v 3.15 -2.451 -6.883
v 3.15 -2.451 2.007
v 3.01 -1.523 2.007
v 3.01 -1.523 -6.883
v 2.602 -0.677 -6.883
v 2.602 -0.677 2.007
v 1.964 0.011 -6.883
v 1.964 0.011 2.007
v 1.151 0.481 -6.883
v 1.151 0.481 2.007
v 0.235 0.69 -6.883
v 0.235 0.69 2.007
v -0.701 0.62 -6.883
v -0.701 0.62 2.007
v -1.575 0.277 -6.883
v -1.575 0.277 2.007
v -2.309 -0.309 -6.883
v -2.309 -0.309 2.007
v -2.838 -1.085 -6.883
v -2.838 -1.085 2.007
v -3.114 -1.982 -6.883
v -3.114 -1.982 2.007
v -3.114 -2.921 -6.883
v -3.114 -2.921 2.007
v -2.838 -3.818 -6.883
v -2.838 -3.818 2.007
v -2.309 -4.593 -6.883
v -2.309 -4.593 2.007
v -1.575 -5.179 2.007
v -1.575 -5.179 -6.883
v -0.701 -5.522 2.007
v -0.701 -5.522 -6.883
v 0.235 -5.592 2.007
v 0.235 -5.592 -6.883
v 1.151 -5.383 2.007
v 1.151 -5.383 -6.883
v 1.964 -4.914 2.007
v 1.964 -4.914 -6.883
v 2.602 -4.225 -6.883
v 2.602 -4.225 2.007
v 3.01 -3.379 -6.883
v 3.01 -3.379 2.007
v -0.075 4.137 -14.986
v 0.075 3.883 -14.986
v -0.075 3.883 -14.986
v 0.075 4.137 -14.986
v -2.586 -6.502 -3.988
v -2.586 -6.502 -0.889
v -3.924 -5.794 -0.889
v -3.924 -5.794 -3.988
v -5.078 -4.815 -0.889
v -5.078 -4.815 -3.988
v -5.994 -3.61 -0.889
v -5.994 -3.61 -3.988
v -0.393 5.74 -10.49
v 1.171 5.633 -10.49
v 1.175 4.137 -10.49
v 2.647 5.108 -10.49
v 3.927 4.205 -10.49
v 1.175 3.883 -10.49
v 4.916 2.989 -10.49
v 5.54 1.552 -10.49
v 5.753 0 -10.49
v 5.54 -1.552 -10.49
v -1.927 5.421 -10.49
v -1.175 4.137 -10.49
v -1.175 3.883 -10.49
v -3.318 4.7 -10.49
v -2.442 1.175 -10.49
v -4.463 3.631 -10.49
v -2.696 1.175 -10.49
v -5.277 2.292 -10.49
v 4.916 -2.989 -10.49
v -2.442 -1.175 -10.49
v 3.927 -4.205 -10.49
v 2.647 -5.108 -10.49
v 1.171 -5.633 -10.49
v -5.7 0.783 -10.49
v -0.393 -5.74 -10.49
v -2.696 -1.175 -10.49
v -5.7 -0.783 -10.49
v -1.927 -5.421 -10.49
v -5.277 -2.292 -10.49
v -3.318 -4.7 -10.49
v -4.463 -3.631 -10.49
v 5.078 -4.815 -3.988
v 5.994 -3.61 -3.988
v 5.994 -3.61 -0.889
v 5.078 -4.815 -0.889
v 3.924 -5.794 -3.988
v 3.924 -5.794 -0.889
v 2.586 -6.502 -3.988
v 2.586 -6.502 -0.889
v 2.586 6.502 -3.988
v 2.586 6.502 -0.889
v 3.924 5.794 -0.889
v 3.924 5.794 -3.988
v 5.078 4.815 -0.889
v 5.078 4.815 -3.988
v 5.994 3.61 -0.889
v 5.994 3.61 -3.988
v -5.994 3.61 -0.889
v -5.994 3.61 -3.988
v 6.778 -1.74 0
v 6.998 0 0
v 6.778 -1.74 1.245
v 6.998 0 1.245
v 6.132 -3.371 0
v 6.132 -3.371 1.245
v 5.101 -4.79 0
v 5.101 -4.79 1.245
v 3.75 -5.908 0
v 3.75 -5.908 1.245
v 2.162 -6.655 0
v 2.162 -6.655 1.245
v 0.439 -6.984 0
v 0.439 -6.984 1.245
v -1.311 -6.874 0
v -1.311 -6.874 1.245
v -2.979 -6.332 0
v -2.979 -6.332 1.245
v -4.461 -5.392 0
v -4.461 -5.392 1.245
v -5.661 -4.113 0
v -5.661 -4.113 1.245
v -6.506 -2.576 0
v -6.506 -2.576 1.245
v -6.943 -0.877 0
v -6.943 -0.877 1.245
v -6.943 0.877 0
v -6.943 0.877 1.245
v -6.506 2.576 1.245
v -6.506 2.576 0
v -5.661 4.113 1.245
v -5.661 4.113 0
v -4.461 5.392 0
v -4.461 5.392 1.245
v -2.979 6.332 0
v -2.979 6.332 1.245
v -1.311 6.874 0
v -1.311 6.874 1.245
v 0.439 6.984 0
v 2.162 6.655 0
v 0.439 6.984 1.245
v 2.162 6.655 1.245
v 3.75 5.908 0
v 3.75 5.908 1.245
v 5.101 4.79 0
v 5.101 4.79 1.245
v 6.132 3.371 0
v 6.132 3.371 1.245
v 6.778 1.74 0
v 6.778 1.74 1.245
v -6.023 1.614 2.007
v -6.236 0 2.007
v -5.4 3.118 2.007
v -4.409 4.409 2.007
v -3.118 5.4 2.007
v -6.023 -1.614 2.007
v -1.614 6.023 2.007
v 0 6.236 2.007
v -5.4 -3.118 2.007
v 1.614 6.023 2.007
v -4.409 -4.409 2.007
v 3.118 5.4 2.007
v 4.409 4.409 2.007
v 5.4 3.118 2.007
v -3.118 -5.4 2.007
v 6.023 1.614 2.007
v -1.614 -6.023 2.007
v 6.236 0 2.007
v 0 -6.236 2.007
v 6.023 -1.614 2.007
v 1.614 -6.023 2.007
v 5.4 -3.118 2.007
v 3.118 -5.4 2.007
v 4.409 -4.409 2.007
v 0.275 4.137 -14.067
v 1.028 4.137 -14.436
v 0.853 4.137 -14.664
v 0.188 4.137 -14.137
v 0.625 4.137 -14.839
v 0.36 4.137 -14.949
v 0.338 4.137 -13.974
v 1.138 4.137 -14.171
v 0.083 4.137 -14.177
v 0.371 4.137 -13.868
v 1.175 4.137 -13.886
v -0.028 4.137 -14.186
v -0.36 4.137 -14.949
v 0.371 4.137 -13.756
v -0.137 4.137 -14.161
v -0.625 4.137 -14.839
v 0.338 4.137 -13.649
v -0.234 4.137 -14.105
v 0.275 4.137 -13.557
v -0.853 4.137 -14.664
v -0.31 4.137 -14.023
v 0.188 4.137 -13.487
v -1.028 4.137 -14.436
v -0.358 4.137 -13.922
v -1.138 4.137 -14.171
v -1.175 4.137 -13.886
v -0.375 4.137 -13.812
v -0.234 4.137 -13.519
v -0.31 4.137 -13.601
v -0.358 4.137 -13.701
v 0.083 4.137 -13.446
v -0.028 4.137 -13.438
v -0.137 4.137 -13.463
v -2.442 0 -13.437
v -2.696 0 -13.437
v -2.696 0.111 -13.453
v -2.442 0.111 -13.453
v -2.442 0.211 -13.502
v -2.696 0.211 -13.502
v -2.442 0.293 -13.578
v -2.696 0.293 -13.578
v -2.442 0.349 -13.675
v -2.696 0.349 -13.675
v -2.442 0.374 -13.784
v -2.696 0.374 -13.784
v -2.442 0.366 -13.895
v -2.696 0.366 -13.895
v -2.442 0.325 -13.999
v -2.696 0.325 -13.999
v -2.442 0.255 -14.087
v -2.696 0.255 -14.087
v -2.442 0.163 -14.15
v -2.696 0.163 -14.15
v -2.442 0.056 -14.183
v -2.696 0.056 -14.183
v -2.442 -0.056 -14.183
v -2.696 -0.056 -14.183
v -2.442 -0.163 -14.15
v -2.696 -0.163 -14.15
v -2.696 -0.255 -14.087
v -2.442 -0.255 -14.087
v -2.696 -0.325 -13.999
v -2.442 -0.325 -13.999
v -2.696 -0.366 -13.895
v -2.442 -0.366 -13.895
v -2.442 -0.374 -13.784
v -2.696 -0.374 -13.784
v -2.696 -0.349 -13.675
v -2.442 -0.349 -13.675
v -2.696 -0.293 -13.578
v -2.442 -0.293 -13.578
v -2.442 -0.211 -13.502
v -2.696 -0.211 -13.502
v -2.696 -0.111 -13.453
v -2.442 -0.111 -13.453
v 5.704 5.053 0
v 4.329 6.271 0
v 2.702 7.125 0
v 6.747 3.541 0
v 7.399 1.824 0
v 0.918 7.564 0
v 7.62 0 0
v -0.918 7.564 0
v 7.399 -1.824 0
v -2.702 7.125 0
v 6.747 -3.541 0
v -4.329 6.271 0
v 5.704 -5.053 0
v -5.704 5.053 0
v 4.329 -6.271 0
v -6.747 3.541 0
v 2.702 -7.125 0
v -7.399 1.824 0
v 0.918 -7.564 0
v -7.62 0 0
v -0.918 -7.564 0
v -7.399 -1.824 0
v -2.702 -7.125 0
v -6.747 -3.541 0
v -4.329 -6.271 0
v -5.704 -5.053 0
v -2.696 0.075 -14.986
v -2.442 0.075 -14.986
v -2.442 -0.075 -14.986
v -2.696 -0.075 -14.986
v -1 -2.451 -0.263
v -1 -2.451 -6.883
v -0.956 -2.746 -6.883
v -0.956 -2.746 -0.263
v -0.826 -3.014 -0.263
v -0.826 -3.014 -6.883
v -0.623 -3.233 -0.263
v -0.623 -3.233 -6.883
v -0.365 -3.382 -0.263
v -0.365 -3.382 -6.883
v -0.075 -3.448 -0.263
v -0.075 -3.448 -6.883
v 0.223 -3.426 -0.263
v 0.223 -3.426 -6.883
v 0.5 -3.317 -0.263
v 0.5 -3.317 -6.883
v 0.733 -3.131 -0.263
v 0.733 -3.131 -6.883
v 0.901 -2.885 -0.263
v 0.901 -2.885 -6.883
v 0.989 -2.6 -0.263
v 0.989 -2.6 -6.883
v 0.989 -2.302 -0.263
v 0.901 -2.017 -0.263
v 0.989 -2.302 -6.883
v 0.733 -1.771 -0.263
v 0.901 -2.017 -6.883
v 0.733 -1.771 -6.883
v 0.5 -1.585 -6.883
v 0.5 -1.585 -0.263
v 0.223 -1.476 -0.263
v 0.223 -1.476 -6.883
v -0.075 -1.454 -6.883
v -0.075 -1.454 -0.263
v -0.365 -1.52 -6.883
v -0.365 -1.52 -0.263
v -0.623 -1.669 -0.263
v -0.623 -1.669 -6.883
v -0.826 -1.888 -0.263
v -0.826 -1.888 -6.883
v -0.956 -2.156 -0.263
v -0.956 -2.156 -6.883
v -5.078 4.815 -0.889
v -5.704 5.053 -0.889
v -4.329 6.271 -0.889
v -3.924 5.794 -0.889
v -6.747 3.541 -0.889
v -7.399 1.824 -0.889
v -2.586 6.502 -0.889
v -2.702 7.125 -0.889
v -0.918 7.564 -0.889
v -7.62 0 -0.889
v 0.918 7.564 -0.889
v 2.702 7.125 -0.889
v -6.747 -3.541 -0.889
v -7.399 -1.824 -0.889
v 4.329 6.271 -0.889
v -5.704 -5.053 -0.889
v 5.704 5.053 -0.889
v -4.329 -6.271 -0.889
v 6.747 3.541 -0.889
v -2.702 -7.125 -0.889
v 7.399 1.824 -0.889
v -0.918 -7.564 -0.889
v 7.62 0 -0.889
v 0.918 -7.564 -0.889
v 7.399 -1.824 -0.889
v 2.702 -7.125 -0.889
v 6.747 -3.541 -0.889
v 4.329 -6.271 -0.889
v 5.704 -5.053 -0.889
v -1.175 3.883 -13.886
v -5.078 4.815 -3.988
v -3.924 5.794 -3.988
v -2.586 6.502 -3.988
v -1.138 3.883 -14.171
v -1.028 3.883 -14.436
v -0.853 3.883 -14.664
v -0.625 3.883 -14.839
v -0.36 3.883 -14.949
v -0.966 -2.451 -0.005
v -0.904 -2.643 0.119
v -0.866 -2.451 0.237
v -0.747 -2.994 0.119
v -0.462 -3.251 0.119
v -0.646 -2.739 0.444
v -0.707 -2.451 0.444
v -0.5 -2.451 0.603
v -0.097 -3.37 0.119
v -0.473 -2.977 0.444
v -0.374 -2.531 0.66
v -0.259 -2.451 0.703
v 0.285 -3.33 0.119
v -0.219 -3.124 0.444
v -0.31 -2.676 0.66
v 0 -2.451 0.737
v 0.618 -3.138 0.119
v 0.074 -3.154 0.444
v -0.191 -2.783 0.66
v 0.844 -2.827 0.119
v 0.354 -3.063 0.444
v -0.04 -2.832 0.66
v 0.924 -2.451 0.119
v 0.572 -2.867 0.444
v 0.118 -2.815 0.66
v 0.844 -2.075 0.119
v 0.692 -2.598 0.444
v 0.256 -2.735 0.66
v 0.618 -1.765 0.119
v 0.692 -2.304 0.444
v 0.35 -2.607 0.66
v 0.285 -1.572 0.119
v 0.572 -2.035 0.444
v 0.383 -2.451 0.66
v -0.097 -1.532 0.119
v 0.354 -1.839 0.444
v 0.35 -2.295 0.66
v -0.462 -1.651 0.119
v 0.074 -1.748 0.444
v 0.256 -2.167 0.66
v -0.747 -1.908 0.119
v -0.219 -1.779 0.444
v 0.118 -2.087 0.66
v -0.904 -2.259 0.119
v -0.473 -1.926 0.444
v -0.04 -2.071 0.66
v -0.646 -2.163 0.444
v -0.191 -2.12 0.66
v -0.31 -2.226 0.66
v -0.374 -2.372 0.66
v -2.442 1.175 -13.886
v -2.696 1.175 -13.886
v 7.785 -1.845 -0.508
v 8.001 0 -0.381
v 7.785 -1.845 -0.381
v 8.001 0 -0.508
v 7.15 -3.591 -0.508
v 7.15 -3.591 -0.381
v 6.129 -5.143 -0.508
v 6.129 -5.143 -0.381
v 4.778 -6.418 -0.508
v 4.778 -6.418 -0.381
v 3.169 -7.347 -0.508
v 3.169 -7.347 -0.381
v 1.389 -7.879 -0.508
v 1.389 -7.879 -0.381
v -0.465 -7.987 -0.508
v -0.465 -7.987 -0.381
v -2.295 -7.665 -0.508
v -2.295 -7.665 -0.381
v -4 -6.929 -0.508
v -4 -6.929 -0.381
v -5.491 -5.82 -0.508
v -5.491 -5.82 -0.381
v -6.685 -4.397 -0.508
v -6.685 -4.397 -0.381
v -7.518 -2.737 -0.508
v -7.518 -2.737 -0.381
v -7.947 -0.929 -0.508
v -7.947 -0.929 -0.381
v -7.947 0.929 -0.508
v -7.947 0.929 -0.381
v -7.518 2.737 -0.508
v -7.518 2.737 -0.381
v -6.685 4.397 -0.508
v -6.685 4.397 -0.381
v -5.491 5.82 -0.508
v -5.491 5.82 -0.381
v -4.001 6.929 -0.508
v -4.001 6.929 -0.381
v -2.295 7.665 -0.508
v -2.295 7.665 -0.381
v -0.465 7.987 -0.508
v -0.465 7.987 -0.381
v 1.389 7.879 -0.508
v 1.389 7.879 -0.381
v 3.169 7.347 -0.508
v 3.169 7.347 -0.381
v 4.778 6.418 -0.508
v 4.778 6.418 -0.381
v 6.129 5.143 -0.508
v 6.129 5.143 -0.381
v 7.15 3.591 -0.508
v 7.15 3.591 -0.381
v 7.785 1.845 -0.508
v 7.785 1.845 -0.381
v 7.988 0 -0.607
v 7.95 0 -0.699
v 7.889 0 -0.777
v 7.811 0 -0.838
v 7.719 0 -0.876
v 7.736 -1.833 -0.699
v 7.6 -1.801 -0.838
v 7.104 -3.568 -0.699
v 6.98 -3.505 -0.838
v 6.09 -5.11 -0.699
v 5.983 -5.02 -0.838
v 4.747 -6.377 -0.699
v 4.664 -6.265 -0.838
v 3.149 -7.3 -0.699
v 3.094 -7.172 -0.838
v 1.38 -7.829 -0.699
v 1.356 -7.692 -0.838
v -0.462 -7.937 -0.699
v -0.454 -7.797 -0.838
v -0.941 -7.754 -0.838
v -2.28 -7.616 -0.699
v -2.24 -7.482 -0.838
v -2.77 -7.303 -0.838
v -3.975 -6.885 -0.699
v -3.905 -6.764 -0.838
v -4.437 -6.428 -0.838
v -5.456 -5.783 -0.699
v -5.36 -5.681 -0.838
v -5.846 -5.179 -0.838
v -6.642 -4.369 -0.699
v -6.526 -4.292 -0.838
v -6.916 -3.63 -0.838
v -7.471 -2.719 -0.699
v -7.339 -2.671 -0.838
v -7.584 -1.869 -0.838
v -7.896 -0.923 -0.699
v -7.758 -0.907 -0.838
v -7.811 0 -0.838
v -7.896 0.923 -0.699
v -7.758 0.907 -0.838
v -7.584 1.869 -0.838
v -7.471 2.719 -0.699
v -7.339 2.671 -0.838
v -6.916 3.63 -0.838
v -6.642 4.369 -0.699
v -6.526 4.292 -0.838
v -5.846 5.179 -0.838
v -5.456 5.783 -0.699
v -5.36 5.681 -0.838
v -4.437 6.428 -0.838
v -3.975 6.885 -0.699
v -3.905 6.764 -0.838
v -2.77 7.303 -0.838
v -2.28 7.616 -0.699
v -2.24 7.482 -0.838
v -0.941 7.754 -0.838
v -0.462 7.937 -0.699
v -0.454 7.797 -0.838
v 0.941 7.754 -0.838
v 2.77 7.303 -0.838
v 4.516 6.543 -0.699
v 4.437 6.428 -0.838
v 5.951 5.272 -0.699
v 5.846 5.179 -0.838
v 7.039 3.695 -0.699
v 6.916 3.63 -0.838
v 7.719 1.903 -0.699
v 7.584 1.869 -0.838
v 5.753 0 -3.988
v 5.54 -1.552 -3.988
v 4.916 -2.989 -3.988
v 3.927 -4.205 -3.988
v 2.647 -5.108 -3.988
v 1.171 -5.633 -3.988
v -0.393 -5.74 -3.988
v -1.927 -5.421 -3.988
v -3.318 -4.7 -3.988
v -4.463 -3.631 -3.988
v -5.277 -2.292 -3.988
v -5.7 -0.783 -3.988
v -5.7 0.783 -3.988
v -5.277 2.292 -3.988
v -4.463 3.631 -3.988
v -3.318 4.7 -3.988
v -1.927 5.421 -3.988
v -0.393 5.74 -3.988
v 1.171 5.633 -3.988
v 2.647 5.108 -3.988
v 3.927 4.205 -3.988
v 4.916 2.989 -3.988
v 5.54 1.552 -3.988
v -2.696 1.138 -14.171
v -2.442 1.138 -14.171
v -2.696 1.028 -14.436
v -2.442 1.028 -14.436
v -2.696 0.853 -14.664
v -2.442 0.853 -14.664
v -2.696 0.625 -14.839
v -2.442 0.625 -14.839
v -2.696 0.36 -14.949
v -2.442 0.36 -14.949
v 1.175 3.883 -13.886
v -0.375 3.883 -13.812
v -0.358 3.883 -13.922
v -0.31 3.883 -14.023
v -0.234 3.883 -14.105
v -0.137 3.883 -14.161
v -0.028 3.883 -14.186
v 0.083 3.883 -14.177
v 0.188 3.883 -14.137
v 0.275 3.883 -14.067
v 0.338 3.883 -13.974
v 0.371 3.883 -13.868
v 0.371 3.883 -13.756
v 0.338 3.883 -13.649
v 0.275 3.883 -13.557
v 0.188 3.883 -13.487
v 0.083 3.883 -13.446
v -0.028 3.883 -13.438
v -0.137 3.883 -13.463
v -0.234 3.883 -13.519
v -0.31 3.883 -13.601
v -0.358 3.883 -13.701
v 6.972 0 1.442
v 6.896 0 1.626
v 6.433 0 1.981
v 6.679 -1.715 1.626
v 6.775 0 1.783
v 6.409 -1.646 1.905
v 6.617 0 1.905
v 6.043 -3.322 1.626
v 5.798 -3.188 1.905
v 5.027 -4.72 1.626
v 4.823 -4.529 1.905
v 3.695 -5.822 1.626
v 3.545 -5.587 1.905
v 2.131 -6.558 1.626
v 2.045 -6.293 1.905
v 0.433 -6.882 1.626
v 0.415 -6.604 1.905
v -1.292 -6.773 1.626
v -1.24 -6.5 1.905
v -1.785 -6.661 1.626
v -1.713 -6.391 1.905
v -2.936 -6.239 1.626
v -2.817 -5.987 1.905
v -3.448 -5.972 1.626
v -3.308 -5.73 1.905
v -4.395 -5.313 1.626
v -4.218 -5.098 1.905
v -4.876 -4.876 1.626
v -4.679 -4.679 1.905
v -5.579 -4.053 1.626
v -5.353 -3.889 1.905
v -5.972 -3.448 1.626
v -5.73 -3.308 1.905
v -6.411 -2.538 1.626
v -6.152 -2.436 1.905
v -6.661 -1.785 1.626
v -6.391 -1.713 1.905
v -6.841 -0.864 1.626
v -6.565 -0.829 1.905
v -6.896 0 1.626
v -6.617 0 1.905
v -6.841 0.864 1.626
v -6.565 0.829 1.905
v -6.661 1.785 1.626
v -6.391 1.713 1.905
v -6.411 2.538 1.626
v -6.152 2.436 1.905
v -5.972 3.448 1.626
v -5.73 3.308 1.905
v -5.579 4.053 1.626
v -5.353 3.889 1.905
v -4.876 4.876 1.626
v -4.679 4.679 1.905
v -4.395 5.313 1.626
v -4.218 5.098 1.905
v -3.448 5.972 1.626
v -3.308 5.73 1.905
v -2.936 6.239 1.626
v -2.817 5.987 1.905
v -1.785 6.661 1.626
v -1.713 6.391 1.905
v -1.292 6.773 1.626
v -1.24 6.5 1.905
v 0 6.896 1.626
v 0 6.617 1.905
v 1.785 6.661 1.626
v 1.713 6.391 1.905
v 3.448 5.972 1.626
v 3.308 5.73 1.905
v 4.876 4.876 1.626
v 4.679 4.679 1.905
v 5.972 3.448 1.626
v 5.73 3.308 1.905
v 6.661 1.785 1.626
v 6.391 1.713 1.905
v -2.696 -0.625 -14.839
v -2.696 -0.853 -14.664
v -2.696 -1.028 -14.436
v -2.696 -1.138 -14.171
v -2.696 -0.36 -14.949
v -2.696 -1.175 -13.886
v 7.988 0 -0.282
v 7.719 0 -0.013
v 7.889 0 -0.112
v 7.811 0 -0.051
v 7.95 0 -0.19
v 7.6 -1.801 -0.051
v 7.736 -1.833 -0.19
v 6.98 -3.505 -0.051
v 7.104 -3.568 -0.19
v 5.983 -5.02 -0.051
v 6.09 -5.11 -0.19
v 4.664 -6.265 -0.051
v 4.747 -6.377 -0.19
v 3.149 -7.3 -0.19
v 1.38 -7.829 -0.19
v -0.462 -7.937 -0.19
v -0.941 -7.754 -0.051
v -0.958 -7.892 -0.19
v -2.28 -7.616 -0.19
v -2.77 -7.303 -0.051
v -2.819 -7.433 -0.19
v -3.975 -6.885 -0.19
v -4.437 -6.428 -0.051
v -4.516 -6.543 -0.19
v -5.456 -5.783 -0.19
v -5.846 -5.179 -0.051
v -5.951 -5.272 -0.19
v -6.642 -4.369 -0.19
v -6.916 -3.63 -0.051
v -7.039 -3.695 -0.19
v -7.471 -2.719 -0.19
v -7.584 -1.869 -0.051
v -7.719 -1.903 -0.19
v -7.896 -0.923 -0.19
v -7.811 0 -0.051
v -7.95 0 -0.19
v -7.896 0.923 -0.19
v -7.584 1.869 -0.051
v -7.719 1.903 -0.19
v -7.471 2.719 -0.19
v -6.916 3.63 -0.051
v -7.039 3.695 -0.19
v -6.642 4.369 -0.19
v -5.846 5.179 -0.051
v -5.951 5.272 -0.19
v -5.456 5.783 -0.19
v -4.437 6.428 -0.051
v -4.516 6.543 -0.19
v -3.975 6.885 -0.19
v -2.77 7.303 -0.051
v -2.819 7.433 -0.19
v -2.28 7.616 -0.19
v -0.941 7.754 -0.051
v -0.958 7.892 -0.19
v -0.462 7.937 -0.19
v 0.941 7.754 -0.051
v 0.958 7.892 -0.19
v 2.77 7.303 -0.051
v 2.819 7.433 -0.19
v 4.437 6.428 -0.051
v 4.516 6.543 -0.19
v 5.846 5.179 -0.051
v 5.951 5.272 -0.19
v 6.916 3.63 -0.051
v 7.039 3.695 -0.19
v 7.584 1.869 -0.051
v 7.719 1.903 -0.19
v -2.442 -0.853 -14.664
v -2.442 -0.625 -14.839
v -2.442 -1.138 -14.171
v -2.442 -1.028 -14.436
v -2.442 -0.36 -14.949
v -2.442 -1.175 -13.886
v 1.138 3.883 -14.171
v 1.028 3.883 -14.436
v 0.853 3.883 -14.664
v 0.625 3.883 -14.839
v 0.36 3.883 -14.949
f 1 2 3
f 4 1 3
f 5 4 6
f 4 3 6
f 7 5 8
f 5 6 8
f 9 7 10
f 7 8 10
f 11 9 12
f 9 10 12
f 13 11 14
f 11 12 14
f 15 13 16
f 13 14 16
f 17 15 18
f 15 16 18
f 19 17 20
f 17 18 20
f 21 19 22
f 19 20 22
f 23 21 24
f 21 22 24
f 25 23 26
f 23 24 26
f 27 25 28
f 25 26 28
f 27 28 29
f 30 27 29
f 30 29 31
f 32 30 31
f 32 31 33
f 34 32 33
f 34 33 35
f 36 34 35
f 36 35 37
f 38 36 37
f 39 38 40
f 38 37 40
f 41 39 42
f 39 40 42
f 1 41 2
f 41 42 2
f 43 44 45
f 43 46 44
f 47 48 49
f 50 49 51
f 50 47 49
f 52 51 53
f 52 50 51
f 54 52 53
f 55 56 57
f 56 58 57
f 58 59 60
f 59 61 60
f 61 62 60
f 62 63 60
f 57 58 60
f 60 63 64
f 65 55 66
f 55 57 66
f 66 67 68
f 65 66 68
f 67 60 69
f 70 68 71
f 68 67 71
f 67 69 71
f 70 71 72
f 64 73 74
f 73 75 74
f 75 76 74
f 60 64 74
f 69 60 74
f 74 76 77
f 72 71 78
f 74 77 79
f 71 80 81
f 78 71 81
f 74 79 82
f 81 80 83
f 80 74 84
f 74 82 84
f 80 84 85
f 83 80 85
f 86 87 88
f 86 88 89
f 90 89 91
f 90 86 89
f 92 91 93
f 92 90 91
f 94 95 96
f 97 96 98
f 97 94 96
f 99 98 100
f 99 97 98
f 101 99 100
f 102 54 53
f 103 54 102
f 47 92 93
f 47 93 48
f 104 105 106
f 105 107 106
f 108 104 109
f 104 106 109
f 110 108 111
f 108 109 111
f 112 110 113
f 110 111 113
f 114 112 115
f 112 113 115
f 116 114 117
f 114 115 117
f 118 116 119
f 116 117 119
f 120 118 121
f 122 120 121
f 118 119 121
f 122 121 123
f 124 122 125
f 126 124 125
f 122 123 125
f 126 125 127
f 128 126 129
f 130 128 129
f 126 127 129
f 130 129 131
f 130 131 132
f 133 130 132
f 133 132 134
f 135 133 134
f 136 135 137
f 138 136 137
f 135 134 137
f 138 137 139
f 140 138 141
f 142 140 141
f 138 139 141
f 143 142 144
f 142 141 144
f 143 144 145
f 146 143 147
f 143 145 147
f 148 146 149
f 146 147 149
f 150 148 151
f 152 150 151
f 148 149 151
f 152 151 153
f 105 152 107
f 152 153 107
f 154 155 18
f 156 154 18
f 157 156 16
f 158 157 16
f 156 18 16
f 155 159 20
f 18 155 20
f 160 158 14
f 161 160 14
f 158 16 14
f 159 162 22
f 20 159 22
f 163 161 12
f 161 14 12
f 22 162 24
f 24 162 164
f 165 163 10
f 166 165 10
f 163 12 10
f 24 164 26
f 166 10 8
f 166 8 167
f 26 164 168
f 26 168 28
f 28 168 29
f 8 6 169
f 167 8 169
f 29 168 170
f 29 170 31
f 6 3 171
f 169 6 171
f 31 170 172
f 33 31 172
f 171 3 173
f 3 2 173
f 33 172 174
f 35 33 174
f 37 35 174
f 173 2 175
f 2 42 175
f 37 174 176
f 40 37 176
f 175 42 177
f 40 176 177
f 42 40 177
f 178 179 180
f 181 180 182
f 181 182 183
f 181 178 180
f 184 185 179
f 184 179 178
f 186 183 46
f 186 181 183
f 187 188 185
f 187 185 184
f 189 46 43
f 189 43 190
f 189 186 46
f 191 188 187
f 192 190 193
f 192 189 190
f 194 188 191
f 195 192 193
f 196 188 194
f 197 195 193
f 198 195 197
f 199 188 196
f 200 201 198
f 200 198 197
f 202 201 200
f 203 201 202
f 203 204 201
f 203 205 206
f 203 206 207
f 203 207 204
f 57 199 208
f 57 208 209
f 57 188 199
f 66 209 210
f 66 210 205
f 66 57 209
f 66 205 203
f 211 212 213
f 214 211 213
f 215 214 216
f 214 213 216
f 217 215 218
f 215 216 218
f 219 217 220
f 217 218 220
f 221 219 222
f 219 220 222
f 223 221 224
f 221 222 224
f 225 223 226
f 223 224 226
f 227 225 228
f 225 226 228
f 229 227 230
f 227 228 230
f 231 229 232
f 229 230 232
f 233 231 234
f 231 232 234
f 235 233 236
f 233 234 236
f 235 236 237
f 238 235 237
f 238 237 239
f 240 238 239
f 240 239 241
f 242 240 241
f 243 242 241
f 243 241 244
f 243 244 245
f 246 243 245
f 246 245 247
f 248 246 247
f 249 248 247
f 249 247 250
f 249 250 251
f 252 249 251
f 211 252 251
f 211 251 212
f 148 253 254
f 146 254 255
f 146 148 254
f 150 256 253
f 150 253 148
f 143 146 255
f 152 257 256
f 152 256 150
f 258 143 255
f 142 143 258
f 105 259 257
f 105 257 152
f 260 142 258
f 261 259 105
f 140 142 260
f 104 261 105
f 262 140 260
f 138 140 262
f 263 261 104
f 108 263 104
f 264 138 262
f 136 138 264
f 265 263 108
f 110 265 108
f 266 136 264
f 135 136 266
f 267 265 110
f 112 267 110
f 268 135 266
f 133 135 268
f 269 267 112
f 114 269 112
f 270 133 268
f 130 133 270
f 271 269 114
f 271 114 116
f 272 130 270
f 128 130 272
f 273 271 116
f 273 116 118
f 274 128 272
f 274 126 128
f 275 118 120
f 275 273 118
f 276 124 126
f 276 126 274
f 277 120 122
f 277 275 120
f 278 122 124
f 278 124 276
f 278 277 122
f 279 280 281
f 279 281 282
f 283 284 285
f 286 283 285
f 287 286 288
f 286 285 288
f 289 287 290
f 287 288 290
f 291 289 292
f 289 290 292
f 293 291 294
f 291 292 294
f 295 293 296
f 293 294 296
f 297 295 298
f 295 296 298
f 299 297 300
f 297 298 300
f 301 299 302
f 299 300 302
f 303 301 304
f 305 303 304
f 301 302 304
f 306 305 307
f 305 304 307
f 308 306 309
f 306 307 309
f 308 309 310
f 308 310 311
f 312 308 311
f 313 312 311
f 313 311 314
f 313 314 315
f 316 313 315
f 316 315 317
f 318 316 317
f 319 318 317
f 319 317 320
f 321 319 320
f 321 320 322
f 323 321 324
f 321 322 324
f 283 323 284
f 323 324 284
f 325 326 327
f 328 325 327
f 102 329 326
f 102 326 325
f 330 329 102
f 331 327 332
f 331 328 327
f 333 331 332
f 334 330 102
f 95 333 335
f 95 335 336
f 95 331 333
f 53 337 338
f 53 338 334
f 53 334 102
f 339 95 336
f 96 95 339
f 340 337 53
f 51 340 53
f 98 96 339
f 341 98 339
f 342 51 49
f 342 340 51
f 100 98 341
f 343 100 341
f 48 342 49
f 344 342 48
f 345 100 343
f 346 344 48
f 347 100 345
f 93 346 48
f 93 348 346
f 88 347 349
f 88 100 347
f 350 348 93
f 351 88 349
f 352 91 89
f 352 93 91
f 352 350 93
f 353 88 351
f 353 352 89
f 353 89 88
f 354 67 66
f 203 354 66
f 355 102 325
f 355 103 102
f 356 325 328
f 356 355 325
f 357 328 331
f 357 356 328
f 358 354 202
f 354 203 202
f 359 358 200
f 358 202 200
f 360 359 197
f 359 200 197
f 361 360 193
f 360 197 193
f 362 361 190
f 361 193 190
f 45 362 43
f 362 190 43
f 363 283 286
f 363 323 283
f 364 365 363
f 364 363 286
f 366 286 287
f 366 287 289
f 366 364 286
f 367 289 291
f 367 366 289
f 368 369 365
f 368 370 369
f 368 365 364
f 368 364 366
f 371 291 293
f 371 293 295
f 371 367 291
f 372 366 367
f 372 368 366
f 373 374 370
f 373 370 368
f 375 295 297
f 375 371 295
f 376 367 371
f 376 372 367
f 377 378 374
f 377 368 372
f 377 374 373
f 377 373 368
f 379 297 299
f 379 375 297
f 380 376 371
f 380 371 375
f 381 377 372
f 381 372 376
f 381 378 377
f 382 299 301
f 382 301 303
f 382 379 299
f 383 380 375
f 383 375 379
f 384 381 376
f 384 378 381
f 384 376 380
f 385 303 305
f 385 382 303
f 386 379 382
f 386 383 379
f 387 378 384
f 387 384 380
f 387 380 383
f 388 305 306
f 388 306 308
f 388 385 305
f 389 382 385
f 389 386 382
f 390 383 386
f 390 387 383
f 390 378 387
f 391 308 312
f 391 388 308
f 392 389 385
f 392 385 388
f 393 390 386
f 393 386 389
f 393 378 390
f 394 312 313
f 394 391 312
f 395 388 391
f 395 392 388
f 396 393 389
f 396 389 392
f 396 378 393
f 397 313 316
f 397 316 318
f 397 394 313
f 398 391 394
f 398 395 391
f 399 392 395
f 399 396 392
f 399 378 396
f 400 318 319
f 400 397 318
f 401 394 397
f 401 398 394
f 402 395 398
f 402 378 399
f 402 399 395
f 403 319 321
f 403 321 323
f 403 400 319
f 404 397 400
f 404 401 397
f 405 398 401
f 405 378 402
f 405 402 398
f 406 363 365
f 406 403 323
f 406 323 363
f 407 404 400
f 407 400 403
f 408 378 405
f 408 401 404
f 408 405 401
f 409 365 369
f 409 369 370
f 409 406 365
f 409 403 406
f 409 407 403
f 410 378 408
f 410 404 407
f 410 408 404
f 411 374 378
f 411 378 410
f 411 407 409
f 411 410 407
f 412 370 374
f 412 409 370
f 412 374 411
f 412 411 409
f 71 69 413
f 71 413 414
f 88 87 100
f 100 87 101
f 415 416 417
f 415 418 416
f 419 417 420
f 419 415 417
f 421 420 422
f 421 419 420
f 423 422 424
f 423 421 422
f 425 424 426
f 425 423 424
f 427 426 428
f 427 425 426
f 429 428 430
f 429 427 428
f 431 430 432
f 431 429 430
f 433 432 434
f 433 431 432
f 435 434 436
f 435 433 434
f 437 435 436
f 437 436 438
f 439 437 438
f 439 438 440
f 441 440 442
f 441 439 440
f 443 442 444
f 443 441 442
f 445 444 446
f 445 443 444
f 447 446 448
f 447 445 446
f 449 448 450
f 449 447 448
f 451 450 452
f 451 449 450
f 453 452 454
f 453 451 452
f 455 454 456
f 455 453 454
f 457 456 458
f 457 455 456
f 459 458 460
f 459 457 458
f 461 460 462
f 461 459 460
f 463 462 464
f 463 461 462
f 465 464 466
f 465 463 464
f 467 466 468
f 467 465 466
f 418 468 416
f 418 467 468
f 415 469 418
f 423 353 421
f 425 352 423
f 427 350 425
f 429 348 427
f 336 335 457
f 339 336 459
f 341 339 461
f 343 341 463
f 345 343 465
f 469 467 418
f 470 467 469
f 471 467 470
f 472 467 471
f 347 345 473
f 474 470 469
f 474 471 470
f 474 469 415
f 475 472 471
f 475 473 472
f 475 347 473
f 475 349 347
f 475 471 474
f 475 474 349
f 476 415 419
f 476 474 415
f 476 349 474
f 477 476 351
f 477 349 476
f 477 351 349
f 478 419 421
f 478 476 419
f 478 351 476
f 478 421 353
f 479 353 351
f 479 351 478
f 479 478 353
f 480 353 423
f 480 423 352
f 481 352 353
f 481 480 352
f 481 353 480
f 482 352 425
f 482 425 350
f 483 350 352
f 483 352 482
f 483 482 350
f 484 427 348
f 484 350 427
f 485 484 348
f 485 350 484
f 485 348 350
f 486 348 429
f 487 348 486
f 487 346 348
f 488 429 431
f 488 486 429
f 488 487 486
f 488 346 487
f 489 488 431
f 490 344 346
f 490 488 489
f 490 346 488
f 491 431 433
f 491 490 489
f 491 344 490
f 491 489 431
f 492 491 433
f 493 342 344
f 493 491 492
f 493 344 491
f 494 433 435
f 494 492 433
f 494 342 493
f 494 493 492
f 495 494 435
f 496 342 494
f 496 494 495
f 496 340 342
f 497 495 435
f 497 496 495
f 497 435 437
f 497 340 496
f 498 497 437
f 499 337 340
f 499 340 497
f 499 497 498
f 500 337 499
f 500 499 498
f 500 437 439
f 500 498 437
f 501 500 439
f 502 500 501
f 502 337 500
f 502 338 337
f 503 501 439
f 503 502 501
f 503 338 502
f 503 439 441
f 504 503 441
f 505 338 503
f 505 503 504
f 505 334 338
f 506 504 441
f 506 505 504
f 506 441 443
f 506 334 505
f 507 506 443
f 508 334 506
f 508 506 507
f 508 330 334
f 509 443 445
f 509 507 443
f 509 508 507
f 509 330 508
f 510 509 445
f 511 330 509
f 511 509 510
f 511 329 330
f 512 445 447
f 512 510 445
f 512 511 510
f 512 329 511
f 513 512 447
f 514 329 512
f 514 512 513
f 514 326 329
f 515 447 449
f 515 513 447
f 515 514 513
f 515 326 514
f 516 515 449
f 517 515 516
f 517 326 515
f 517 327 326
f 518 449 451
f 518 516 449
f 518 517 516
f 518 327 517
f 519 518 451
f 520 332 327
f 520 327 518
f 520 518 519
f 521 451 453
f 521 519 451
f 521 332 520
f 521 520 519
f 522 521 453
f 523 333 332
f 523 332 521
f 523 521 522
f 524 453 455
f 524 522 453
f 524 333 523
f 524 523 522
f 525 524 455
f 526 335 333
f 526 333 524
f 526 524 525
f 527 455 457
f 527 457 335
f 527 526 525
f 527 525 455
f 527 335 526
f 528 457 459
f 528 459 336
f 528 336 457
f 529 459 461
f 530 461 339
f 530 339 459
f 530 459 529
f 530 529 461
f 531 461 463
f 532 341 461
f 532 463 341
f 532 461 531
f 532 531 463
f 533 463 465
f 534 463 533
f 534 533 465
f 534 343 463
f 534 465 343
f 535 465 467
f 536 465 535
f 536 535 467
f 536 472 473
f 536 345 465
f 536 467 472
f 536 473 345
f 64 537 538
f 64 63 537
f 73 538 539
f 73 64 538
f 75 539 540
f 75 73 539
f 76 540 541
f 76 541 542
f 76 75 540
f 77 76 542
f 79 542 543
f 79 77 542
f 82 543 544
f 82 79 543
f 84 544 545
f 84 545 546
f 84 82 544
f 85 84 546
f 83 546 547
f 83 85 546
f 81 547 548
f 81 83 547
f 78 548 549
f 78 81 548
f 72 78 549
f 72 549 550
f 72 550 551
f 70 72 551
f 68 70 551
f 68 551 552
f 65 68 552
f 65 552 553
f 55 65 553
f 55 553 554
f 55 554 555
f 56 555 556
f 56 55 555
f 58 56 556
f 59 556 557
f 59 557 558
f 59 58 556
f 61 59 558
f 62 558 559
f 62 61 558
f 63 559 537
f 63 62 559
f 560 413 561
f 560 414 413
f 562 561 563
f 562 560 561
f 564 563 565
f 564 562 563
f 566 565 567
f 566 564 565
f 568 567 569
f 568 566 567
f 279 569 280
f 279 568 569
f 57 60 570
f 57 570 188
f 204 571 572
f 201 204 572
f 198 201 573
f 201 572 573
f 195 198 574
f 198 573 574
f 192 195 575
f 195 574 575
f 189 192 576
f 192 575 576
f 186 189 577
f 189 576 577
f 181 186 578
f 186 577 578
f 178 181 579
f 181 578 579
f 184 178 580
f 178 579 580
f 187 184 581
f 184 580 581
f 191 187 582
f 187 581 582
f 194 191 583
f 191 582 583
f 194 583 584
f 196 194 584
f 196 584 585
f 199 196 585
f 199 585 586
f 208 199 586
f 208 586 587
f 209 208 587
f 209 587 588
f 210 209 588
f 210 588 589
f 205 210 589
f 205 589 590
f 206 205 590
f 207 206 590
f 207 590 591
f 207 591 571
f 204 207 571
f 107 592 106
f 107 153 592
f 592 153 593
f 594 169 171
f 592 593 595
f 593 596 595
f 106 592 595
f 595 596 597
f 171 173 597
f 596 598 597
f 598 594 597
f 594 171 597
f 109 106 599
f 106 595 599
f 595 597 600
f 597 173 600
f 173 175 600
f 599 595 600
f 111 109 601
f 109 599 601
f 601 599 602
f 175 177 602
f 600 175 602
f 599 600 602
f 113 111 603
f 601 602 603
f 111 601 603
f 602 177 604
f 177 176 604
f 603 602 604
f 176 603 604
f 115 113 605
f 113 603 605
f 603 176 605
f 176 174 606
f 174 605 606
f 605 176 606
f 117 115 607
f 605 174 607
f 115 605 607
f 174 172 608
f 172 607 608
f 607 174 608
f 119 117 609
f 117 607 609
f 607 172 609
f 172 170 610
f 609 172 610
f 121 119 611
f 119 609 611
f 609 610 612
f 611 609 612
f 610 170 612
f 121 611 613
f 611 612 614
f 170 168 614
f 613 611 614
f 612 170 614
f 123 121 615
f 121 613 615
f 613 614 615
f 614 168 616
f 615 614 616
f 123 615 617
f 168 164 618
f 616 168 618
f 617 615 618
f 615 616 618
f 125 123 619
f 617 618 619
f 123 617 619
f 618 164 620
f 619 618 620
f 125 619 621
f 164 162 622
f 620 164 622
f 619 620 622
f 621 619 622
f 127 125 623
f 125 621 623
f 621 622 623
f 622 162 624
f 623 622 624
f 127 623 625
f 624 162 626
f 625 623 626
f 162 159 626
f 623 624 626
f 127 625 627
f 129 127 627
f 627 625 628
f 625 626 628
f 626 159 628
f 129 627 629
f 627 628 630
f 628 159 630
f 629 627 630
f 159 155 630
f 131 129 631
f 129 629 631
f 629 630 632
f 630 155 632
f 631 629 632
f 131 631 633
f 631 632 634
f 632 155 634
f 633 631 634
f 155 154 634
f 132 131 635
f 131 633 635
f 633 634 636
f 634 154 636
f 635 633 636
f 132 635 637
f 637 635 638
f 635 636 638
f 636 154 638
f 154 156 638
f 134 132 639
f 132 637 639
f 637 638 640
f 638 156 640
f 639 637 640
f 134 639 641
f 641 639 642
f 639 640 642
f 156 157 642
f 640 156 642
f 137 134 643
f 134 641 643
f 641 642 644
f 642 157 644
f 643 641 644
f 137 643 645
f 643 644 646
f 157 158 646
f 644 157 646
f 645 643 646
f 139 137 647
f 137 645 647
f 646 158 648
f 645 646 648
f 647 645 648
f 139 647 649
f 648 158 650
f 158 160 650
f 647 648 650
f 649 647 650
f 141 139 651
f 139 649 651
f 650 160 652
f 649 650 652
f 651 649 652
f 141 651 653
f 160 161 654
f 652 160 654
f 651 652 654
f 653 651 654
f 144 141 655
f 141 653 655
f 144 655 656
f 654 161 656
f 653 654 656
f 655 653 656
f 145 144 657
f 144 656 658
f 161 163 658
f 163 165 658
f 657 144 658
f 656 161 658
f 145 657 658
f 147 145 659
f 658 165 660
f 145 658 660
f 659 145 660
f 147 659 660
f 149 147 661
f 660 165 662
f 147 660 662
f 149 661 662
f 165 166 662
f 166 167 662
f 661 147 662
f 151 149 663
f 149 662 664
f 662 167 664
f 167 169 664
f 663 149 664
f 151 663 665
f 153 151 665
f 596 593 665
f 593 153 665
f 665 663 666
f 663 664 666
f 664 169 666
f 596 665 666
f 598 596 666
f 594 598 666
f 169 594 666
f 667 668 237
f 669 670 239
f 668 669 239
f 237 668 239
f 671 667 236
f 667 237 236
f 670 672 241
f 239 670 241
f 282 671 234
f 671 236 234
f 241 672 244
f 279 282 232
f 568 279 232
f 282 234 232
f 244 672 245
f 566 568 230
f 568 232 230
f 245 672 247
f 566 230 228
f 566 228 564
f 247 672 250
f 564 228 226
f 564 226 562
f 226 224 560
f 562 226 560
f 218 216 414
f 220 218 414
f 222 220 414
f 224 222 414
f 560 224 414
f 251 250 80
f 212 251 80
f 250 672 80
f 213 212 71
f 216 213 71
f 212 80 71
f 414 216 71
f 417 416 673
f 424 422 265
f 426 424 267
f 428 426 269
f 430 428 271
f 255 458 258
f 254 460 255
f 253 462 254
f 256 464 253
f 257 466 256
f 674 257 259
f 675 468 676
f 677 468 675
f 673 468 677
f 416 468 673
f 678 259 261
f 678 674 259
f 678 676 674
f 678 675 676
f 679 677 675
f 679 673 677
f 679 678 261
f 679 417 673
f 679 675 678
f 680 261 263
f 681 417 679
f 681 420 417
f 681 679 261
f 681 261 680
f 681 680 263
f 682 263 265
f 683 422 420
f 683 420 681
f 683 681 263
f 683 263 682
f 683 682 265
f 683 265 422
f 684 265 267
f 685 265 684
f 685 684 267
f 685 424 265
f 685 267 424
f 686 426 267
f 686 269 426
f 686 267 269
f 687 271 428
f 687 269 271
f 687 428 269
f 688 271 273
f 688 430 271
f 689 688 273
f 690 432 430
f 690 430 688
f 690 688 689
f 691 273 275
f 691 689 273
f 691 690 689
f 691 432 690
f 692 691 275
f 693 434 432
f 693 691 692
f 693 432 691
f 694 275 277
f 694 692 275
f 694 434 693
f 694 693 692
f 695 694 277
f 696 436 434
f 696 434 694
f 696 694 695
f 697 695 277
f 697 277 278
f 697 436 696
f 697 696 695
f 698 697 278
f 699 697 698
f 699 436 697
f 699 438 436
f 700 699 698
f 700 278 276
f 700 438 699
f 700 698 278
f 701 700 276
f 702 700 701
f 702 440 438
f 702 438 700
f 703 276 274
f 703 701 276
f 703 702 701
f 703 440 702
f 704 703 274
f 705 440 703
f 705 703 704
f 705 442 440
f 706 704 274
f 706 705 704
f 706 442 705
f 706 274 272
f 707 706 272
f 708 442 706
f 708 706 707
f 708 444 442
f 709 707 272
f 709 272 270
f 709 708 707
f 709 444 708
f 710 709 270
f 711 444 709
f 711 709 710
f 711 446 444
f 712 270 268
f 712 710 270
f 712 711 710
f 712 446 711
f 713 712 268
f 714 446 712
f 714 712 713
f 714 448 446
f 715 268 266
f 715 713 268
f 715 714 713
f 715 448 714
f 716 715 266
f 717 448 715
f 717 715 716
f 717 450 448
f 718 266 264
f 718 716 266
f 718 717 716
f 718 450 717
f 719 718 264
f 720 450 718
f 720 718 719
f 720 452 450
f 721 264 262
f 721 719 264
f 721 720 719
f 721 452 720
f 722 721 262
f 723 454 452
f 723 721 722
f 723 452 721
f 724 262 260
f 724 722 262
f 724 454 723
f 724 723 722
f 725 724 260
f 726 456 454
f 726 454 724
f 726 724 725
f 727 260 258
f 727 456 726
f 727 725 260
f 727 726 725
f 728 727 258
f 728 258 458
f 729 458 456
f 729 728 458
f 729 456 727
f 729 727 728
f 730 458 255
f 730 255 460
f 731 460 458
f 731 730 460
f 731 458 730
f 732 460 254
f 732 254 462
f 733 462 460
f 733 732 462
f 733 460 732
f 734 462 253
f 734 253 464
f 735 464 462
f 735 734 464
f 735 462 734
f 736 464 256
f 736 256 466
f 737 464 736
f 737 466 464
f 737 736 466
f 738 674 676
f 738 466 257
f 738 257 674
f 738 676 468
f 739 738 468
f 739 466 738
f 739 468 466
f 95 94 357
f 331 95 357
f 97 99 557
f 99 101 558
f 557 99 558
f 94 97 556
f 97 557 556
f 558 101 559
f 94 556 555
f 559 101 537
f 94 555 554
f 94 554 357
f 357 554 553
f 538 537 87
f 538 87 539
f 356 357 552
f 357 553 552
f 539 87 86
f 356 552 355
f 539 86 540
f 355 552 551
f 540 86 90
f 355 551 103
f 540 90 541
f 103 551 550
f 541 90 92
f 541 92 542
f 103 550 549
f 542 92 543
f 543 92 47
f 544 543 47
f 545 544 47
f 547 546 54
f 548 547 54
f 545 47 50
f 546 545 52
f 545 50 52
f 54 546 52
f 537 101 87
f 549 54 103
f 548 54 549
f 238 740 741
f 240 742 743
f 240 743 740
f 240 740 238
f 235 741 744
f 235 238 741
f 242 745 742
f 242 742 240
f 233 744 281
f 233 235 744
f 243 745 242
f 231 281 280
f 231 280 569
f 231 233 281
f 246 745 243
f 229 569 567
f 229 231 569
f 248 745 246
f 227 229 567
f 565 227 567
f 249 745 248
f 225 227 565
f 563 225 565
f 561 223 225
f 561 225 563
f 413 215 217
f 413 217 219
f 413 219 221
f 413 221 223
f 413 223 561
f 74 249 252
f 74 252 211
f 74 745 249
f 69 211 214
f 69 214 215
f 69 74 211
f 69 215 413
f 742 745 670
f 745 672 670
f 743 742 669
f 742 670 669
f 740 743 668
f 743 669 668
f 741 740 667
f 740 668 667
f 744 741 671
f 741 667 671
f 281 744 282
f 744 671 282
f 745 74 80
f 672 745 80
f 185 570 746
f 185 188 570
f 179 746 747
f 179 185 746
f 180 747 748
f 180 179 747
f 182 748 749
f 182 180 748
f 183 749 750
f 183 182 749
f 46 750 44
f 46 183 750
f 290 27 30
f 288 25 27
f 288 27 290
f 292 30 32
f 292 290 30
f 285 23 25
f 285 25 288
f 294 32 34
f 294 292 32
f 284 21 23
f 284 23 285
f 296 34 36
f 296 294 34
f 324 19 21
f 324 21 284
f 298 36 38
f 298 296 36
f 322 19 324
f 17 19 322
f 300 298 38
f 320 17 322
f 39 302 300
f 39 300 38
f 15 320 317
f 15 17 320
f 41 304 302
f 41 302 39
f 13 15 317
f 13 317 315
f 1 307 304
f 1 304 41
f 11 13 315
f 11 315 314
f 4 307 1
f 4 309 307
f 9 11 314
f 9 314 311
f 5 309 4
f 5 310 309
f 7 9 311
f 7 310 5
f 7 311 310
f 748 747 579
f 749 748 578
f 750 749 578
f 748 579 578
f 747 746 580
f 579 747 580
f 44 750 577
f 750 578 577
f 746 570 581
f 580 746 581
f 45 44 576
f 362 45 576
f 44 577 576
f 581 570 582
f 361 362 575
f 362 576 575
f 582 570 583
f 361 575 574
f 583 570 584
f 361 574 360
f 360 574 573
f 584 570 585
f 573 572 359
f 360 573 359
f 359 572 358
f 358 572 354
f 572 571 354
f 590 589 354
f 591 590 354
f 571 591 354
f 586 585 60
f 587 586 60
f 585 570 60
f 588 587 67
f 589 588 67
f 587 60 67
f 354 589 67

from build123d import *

# Parameters (mm, degrees)
SKETCH2_W                    = 10.4902
SKETCH2_H                    = 5.7531
SKETCH3_W                    = 3.0988
SKETCH3_H                    = 1.2446
SKETCH4_R                    = 3.1496
CUT_EXTRUDE1_DEPTH           = 8.89
SKETCH5_R                    = 1
BOSS_EXTRUDE1_DEPTH          = 7.62
FILLET1_R                    = 1
SKETCH6_W                    = 2.35
SKETCH6_H                    = 0.254
SKETCH6_W_2                  = 0.254
SKETCH6_H_2                  = 2.35
EXTRUDE_THIN1_DEPTH          = 4.4958
FILLET2_R                    = 1.1
F_0_75_0_75_DIAMETER_HOLE1_D = 0.75
F_0_75_0_75_DIAMETER_HOLE2_D = 0.75
SKETCH16_OUTSIDE_W           = 23.662
SKETCH16_OUTSIDE_H           = 23.662
SKETCH16_OUTSIDE_W_2         = 11.9888
SKETCH16_OUTSIDE_H_2         = 13.0048
CUT_EXTRUDE2_DEPTH           = 9.6012


with BuildPart() as part:
    # Sketch2 → Revolve1 (revolve)
    with BuildSketch(Plane(origin=(0, 0, 0), x_dir=(0, 0, -1), z_dir=(1, 0, 0)), mode=Mode.PRIVATE) as revolve1_sk:
        with BuildLine():
            Line((-2.0066, 0), (0, 0))
            Line((0, 0), (0, 5.7531))
            Line((0, 5.7531), (0, 6.9977))
            Line((0, 6.9977), (-1.2446, 6.9977))
            ThreePointArc((-1.2446, 6.9977), (-1.783415367, 6.774515367), (-2.0066, 6.2357))
            Line((-2.0066, 6.2357), (-2.0066, 0))
        make_face()
        with Locations((5.2451, 2.87655)):
            Rectangle(SKETCH2_W, SKETCH2_H)
    revolve(revolve1_sk.sketch.rotate(Axis((0, 0, 7.880629527), (0, 0, -1)), 90), axis=Axis((0, 0, 7.880629527), (0, 0, -1)))

    # Sketch4 → Cut-Extrude1 (cut)
    with BuildSketch(Plane.XY.offset(2.0066)):
        with Locations((0, -2.4511)):
            Circle(SKETCH4_R)
    extrude(amount=-CUT_EXTRUDE1_DEPTH, mode=Mode.SUBTRACT)


with BuildPart() as body_2:
    # Sketch3 → Revolve2 (revolve)
    with BuildSketch(Plane(origin=(0, 0, 0), x_dir=(0, 0, -1), z_dir=(1, 0, 0)), mode=Mode.PRIVATE) as revolve2_sk:
        with Locations((2.4384, 6.3754)):
            Rectangle(SKETCH3_W, SKETCH3_H)
        with BuildLine():
            ThreePointArc((0, 7.62), (0.111592316, 7.889407684), (0.381, 8.001))
            Line((0.381, 8.001), (0.508, 8.001))
            ThreePointArc((0.508, 8.001), (0.777407684, 7.889407684), (0.889, 7.62))
            Line((0.889, 7.62), (0.889, 5.7531))
            Line((0.889, 5.7531), (0, 5.7531))
            Line((0, 5.7531), (0, 7.62))
        make_face()
    revolve(revolve2_sk.sketch.rotate(Axis((0, 0, 6.77031441), (0, 0, -1)), 90), axis=Axis((0, 0, 6.77031441), (0, 0, -1)))


    add(part.part)  # Boss-Extrude1 merges part
    # Sketch5 → Boss-Extrude1 (add)
    with BuildSketch(Plane.XY.offset(-6.8834)):
        with Locations(Location((0, -2.4511, 0), (0, 0, 180))):
            Circle(SKETCH5_R)
    extrude(amount=BOSS_EXTRUDE1_DEPTH)

    # Fillet1
    fillet1_edges = [body_2.edges().sort_by_distance(p)[0] for p in [
        (1, -2.4511, 0.7366),
    ]]
    fillet(fillet1_edges, radius=FILLET1_R)

    # Sketch6 → Extrude-Thin1 (add)
    with BuildSketch(Plane(origin=(0, 0, -10.4902), x_dir=(-1, 0, 0), z_dir=(0, 0, -1))):
        with Locations((0, 4.010257453)):
            Rectangle(SKETCH6_W, SKETCH6_H)
        with Locations((2.568957238, 0)):
            Rectangle(SKETCH6_W_2, SKETCH6_H_2)
    extrude(amount=EXTRUDE_THIN1_DEPTH)

    # Fillet2
    fillet2_edges = [body_2.edges().sort_by_distance(p)[0] for p in [
        (-1.175, 4.010257453, -14.986),
        (1.175, 4.010257453, -14.986),
        (-2.568957238, -1.175, -14.986),
        (-2.568957238, 1.175, -14.986),
    ]]
    fillet(fillet2_edges, radius=FILLET2_R)

    # Ø0.75 (0.75) Diameter Hole1 (through all)
    with Locations(Plane(origin=(-2.441957238, 0, 0), x_dir=(0, 0, -1), z_dir=(1, 0, 0))):
        with Locations((13.811758, 0)):
            Hole(F_0_75_0_75_DIAMETER_HOLE1_D / 2)

    # Ø0.75 (0.75) Diameter Hole2 (through all)
    with Locations(Plane(origin=(0, 4.137257453, 0), x_dir=(1, 0, 0), z_dir=(0, 1, 0))):
        with Locations((0, 13.811758)):
            Hole(F_0_75_0_75_DIAMETER_HOLE2_D / 2)

    # Sketch16 outside → Cut-Extrude2 (cut)
    with BuildSketch(Plane(origin=(0, 0, -10.4902), x_dir=(-1, 0, 0), z_dir=(0, 0, -1))):
        Rectangle(SKETCH16_OUTSIDE_W, SKETCH16_OUTSIDE_H)
        Rectangle(SKETCH16_OUTSIDE_W_2, SKETCH16_OUTSIDE_H_2, mode=Mode.SUBTRACT)
    extrude(amount=-CUT_EXTRUDE2_DEPTH, mode=Mode.SUBTRACT)


solid = body_2.part
